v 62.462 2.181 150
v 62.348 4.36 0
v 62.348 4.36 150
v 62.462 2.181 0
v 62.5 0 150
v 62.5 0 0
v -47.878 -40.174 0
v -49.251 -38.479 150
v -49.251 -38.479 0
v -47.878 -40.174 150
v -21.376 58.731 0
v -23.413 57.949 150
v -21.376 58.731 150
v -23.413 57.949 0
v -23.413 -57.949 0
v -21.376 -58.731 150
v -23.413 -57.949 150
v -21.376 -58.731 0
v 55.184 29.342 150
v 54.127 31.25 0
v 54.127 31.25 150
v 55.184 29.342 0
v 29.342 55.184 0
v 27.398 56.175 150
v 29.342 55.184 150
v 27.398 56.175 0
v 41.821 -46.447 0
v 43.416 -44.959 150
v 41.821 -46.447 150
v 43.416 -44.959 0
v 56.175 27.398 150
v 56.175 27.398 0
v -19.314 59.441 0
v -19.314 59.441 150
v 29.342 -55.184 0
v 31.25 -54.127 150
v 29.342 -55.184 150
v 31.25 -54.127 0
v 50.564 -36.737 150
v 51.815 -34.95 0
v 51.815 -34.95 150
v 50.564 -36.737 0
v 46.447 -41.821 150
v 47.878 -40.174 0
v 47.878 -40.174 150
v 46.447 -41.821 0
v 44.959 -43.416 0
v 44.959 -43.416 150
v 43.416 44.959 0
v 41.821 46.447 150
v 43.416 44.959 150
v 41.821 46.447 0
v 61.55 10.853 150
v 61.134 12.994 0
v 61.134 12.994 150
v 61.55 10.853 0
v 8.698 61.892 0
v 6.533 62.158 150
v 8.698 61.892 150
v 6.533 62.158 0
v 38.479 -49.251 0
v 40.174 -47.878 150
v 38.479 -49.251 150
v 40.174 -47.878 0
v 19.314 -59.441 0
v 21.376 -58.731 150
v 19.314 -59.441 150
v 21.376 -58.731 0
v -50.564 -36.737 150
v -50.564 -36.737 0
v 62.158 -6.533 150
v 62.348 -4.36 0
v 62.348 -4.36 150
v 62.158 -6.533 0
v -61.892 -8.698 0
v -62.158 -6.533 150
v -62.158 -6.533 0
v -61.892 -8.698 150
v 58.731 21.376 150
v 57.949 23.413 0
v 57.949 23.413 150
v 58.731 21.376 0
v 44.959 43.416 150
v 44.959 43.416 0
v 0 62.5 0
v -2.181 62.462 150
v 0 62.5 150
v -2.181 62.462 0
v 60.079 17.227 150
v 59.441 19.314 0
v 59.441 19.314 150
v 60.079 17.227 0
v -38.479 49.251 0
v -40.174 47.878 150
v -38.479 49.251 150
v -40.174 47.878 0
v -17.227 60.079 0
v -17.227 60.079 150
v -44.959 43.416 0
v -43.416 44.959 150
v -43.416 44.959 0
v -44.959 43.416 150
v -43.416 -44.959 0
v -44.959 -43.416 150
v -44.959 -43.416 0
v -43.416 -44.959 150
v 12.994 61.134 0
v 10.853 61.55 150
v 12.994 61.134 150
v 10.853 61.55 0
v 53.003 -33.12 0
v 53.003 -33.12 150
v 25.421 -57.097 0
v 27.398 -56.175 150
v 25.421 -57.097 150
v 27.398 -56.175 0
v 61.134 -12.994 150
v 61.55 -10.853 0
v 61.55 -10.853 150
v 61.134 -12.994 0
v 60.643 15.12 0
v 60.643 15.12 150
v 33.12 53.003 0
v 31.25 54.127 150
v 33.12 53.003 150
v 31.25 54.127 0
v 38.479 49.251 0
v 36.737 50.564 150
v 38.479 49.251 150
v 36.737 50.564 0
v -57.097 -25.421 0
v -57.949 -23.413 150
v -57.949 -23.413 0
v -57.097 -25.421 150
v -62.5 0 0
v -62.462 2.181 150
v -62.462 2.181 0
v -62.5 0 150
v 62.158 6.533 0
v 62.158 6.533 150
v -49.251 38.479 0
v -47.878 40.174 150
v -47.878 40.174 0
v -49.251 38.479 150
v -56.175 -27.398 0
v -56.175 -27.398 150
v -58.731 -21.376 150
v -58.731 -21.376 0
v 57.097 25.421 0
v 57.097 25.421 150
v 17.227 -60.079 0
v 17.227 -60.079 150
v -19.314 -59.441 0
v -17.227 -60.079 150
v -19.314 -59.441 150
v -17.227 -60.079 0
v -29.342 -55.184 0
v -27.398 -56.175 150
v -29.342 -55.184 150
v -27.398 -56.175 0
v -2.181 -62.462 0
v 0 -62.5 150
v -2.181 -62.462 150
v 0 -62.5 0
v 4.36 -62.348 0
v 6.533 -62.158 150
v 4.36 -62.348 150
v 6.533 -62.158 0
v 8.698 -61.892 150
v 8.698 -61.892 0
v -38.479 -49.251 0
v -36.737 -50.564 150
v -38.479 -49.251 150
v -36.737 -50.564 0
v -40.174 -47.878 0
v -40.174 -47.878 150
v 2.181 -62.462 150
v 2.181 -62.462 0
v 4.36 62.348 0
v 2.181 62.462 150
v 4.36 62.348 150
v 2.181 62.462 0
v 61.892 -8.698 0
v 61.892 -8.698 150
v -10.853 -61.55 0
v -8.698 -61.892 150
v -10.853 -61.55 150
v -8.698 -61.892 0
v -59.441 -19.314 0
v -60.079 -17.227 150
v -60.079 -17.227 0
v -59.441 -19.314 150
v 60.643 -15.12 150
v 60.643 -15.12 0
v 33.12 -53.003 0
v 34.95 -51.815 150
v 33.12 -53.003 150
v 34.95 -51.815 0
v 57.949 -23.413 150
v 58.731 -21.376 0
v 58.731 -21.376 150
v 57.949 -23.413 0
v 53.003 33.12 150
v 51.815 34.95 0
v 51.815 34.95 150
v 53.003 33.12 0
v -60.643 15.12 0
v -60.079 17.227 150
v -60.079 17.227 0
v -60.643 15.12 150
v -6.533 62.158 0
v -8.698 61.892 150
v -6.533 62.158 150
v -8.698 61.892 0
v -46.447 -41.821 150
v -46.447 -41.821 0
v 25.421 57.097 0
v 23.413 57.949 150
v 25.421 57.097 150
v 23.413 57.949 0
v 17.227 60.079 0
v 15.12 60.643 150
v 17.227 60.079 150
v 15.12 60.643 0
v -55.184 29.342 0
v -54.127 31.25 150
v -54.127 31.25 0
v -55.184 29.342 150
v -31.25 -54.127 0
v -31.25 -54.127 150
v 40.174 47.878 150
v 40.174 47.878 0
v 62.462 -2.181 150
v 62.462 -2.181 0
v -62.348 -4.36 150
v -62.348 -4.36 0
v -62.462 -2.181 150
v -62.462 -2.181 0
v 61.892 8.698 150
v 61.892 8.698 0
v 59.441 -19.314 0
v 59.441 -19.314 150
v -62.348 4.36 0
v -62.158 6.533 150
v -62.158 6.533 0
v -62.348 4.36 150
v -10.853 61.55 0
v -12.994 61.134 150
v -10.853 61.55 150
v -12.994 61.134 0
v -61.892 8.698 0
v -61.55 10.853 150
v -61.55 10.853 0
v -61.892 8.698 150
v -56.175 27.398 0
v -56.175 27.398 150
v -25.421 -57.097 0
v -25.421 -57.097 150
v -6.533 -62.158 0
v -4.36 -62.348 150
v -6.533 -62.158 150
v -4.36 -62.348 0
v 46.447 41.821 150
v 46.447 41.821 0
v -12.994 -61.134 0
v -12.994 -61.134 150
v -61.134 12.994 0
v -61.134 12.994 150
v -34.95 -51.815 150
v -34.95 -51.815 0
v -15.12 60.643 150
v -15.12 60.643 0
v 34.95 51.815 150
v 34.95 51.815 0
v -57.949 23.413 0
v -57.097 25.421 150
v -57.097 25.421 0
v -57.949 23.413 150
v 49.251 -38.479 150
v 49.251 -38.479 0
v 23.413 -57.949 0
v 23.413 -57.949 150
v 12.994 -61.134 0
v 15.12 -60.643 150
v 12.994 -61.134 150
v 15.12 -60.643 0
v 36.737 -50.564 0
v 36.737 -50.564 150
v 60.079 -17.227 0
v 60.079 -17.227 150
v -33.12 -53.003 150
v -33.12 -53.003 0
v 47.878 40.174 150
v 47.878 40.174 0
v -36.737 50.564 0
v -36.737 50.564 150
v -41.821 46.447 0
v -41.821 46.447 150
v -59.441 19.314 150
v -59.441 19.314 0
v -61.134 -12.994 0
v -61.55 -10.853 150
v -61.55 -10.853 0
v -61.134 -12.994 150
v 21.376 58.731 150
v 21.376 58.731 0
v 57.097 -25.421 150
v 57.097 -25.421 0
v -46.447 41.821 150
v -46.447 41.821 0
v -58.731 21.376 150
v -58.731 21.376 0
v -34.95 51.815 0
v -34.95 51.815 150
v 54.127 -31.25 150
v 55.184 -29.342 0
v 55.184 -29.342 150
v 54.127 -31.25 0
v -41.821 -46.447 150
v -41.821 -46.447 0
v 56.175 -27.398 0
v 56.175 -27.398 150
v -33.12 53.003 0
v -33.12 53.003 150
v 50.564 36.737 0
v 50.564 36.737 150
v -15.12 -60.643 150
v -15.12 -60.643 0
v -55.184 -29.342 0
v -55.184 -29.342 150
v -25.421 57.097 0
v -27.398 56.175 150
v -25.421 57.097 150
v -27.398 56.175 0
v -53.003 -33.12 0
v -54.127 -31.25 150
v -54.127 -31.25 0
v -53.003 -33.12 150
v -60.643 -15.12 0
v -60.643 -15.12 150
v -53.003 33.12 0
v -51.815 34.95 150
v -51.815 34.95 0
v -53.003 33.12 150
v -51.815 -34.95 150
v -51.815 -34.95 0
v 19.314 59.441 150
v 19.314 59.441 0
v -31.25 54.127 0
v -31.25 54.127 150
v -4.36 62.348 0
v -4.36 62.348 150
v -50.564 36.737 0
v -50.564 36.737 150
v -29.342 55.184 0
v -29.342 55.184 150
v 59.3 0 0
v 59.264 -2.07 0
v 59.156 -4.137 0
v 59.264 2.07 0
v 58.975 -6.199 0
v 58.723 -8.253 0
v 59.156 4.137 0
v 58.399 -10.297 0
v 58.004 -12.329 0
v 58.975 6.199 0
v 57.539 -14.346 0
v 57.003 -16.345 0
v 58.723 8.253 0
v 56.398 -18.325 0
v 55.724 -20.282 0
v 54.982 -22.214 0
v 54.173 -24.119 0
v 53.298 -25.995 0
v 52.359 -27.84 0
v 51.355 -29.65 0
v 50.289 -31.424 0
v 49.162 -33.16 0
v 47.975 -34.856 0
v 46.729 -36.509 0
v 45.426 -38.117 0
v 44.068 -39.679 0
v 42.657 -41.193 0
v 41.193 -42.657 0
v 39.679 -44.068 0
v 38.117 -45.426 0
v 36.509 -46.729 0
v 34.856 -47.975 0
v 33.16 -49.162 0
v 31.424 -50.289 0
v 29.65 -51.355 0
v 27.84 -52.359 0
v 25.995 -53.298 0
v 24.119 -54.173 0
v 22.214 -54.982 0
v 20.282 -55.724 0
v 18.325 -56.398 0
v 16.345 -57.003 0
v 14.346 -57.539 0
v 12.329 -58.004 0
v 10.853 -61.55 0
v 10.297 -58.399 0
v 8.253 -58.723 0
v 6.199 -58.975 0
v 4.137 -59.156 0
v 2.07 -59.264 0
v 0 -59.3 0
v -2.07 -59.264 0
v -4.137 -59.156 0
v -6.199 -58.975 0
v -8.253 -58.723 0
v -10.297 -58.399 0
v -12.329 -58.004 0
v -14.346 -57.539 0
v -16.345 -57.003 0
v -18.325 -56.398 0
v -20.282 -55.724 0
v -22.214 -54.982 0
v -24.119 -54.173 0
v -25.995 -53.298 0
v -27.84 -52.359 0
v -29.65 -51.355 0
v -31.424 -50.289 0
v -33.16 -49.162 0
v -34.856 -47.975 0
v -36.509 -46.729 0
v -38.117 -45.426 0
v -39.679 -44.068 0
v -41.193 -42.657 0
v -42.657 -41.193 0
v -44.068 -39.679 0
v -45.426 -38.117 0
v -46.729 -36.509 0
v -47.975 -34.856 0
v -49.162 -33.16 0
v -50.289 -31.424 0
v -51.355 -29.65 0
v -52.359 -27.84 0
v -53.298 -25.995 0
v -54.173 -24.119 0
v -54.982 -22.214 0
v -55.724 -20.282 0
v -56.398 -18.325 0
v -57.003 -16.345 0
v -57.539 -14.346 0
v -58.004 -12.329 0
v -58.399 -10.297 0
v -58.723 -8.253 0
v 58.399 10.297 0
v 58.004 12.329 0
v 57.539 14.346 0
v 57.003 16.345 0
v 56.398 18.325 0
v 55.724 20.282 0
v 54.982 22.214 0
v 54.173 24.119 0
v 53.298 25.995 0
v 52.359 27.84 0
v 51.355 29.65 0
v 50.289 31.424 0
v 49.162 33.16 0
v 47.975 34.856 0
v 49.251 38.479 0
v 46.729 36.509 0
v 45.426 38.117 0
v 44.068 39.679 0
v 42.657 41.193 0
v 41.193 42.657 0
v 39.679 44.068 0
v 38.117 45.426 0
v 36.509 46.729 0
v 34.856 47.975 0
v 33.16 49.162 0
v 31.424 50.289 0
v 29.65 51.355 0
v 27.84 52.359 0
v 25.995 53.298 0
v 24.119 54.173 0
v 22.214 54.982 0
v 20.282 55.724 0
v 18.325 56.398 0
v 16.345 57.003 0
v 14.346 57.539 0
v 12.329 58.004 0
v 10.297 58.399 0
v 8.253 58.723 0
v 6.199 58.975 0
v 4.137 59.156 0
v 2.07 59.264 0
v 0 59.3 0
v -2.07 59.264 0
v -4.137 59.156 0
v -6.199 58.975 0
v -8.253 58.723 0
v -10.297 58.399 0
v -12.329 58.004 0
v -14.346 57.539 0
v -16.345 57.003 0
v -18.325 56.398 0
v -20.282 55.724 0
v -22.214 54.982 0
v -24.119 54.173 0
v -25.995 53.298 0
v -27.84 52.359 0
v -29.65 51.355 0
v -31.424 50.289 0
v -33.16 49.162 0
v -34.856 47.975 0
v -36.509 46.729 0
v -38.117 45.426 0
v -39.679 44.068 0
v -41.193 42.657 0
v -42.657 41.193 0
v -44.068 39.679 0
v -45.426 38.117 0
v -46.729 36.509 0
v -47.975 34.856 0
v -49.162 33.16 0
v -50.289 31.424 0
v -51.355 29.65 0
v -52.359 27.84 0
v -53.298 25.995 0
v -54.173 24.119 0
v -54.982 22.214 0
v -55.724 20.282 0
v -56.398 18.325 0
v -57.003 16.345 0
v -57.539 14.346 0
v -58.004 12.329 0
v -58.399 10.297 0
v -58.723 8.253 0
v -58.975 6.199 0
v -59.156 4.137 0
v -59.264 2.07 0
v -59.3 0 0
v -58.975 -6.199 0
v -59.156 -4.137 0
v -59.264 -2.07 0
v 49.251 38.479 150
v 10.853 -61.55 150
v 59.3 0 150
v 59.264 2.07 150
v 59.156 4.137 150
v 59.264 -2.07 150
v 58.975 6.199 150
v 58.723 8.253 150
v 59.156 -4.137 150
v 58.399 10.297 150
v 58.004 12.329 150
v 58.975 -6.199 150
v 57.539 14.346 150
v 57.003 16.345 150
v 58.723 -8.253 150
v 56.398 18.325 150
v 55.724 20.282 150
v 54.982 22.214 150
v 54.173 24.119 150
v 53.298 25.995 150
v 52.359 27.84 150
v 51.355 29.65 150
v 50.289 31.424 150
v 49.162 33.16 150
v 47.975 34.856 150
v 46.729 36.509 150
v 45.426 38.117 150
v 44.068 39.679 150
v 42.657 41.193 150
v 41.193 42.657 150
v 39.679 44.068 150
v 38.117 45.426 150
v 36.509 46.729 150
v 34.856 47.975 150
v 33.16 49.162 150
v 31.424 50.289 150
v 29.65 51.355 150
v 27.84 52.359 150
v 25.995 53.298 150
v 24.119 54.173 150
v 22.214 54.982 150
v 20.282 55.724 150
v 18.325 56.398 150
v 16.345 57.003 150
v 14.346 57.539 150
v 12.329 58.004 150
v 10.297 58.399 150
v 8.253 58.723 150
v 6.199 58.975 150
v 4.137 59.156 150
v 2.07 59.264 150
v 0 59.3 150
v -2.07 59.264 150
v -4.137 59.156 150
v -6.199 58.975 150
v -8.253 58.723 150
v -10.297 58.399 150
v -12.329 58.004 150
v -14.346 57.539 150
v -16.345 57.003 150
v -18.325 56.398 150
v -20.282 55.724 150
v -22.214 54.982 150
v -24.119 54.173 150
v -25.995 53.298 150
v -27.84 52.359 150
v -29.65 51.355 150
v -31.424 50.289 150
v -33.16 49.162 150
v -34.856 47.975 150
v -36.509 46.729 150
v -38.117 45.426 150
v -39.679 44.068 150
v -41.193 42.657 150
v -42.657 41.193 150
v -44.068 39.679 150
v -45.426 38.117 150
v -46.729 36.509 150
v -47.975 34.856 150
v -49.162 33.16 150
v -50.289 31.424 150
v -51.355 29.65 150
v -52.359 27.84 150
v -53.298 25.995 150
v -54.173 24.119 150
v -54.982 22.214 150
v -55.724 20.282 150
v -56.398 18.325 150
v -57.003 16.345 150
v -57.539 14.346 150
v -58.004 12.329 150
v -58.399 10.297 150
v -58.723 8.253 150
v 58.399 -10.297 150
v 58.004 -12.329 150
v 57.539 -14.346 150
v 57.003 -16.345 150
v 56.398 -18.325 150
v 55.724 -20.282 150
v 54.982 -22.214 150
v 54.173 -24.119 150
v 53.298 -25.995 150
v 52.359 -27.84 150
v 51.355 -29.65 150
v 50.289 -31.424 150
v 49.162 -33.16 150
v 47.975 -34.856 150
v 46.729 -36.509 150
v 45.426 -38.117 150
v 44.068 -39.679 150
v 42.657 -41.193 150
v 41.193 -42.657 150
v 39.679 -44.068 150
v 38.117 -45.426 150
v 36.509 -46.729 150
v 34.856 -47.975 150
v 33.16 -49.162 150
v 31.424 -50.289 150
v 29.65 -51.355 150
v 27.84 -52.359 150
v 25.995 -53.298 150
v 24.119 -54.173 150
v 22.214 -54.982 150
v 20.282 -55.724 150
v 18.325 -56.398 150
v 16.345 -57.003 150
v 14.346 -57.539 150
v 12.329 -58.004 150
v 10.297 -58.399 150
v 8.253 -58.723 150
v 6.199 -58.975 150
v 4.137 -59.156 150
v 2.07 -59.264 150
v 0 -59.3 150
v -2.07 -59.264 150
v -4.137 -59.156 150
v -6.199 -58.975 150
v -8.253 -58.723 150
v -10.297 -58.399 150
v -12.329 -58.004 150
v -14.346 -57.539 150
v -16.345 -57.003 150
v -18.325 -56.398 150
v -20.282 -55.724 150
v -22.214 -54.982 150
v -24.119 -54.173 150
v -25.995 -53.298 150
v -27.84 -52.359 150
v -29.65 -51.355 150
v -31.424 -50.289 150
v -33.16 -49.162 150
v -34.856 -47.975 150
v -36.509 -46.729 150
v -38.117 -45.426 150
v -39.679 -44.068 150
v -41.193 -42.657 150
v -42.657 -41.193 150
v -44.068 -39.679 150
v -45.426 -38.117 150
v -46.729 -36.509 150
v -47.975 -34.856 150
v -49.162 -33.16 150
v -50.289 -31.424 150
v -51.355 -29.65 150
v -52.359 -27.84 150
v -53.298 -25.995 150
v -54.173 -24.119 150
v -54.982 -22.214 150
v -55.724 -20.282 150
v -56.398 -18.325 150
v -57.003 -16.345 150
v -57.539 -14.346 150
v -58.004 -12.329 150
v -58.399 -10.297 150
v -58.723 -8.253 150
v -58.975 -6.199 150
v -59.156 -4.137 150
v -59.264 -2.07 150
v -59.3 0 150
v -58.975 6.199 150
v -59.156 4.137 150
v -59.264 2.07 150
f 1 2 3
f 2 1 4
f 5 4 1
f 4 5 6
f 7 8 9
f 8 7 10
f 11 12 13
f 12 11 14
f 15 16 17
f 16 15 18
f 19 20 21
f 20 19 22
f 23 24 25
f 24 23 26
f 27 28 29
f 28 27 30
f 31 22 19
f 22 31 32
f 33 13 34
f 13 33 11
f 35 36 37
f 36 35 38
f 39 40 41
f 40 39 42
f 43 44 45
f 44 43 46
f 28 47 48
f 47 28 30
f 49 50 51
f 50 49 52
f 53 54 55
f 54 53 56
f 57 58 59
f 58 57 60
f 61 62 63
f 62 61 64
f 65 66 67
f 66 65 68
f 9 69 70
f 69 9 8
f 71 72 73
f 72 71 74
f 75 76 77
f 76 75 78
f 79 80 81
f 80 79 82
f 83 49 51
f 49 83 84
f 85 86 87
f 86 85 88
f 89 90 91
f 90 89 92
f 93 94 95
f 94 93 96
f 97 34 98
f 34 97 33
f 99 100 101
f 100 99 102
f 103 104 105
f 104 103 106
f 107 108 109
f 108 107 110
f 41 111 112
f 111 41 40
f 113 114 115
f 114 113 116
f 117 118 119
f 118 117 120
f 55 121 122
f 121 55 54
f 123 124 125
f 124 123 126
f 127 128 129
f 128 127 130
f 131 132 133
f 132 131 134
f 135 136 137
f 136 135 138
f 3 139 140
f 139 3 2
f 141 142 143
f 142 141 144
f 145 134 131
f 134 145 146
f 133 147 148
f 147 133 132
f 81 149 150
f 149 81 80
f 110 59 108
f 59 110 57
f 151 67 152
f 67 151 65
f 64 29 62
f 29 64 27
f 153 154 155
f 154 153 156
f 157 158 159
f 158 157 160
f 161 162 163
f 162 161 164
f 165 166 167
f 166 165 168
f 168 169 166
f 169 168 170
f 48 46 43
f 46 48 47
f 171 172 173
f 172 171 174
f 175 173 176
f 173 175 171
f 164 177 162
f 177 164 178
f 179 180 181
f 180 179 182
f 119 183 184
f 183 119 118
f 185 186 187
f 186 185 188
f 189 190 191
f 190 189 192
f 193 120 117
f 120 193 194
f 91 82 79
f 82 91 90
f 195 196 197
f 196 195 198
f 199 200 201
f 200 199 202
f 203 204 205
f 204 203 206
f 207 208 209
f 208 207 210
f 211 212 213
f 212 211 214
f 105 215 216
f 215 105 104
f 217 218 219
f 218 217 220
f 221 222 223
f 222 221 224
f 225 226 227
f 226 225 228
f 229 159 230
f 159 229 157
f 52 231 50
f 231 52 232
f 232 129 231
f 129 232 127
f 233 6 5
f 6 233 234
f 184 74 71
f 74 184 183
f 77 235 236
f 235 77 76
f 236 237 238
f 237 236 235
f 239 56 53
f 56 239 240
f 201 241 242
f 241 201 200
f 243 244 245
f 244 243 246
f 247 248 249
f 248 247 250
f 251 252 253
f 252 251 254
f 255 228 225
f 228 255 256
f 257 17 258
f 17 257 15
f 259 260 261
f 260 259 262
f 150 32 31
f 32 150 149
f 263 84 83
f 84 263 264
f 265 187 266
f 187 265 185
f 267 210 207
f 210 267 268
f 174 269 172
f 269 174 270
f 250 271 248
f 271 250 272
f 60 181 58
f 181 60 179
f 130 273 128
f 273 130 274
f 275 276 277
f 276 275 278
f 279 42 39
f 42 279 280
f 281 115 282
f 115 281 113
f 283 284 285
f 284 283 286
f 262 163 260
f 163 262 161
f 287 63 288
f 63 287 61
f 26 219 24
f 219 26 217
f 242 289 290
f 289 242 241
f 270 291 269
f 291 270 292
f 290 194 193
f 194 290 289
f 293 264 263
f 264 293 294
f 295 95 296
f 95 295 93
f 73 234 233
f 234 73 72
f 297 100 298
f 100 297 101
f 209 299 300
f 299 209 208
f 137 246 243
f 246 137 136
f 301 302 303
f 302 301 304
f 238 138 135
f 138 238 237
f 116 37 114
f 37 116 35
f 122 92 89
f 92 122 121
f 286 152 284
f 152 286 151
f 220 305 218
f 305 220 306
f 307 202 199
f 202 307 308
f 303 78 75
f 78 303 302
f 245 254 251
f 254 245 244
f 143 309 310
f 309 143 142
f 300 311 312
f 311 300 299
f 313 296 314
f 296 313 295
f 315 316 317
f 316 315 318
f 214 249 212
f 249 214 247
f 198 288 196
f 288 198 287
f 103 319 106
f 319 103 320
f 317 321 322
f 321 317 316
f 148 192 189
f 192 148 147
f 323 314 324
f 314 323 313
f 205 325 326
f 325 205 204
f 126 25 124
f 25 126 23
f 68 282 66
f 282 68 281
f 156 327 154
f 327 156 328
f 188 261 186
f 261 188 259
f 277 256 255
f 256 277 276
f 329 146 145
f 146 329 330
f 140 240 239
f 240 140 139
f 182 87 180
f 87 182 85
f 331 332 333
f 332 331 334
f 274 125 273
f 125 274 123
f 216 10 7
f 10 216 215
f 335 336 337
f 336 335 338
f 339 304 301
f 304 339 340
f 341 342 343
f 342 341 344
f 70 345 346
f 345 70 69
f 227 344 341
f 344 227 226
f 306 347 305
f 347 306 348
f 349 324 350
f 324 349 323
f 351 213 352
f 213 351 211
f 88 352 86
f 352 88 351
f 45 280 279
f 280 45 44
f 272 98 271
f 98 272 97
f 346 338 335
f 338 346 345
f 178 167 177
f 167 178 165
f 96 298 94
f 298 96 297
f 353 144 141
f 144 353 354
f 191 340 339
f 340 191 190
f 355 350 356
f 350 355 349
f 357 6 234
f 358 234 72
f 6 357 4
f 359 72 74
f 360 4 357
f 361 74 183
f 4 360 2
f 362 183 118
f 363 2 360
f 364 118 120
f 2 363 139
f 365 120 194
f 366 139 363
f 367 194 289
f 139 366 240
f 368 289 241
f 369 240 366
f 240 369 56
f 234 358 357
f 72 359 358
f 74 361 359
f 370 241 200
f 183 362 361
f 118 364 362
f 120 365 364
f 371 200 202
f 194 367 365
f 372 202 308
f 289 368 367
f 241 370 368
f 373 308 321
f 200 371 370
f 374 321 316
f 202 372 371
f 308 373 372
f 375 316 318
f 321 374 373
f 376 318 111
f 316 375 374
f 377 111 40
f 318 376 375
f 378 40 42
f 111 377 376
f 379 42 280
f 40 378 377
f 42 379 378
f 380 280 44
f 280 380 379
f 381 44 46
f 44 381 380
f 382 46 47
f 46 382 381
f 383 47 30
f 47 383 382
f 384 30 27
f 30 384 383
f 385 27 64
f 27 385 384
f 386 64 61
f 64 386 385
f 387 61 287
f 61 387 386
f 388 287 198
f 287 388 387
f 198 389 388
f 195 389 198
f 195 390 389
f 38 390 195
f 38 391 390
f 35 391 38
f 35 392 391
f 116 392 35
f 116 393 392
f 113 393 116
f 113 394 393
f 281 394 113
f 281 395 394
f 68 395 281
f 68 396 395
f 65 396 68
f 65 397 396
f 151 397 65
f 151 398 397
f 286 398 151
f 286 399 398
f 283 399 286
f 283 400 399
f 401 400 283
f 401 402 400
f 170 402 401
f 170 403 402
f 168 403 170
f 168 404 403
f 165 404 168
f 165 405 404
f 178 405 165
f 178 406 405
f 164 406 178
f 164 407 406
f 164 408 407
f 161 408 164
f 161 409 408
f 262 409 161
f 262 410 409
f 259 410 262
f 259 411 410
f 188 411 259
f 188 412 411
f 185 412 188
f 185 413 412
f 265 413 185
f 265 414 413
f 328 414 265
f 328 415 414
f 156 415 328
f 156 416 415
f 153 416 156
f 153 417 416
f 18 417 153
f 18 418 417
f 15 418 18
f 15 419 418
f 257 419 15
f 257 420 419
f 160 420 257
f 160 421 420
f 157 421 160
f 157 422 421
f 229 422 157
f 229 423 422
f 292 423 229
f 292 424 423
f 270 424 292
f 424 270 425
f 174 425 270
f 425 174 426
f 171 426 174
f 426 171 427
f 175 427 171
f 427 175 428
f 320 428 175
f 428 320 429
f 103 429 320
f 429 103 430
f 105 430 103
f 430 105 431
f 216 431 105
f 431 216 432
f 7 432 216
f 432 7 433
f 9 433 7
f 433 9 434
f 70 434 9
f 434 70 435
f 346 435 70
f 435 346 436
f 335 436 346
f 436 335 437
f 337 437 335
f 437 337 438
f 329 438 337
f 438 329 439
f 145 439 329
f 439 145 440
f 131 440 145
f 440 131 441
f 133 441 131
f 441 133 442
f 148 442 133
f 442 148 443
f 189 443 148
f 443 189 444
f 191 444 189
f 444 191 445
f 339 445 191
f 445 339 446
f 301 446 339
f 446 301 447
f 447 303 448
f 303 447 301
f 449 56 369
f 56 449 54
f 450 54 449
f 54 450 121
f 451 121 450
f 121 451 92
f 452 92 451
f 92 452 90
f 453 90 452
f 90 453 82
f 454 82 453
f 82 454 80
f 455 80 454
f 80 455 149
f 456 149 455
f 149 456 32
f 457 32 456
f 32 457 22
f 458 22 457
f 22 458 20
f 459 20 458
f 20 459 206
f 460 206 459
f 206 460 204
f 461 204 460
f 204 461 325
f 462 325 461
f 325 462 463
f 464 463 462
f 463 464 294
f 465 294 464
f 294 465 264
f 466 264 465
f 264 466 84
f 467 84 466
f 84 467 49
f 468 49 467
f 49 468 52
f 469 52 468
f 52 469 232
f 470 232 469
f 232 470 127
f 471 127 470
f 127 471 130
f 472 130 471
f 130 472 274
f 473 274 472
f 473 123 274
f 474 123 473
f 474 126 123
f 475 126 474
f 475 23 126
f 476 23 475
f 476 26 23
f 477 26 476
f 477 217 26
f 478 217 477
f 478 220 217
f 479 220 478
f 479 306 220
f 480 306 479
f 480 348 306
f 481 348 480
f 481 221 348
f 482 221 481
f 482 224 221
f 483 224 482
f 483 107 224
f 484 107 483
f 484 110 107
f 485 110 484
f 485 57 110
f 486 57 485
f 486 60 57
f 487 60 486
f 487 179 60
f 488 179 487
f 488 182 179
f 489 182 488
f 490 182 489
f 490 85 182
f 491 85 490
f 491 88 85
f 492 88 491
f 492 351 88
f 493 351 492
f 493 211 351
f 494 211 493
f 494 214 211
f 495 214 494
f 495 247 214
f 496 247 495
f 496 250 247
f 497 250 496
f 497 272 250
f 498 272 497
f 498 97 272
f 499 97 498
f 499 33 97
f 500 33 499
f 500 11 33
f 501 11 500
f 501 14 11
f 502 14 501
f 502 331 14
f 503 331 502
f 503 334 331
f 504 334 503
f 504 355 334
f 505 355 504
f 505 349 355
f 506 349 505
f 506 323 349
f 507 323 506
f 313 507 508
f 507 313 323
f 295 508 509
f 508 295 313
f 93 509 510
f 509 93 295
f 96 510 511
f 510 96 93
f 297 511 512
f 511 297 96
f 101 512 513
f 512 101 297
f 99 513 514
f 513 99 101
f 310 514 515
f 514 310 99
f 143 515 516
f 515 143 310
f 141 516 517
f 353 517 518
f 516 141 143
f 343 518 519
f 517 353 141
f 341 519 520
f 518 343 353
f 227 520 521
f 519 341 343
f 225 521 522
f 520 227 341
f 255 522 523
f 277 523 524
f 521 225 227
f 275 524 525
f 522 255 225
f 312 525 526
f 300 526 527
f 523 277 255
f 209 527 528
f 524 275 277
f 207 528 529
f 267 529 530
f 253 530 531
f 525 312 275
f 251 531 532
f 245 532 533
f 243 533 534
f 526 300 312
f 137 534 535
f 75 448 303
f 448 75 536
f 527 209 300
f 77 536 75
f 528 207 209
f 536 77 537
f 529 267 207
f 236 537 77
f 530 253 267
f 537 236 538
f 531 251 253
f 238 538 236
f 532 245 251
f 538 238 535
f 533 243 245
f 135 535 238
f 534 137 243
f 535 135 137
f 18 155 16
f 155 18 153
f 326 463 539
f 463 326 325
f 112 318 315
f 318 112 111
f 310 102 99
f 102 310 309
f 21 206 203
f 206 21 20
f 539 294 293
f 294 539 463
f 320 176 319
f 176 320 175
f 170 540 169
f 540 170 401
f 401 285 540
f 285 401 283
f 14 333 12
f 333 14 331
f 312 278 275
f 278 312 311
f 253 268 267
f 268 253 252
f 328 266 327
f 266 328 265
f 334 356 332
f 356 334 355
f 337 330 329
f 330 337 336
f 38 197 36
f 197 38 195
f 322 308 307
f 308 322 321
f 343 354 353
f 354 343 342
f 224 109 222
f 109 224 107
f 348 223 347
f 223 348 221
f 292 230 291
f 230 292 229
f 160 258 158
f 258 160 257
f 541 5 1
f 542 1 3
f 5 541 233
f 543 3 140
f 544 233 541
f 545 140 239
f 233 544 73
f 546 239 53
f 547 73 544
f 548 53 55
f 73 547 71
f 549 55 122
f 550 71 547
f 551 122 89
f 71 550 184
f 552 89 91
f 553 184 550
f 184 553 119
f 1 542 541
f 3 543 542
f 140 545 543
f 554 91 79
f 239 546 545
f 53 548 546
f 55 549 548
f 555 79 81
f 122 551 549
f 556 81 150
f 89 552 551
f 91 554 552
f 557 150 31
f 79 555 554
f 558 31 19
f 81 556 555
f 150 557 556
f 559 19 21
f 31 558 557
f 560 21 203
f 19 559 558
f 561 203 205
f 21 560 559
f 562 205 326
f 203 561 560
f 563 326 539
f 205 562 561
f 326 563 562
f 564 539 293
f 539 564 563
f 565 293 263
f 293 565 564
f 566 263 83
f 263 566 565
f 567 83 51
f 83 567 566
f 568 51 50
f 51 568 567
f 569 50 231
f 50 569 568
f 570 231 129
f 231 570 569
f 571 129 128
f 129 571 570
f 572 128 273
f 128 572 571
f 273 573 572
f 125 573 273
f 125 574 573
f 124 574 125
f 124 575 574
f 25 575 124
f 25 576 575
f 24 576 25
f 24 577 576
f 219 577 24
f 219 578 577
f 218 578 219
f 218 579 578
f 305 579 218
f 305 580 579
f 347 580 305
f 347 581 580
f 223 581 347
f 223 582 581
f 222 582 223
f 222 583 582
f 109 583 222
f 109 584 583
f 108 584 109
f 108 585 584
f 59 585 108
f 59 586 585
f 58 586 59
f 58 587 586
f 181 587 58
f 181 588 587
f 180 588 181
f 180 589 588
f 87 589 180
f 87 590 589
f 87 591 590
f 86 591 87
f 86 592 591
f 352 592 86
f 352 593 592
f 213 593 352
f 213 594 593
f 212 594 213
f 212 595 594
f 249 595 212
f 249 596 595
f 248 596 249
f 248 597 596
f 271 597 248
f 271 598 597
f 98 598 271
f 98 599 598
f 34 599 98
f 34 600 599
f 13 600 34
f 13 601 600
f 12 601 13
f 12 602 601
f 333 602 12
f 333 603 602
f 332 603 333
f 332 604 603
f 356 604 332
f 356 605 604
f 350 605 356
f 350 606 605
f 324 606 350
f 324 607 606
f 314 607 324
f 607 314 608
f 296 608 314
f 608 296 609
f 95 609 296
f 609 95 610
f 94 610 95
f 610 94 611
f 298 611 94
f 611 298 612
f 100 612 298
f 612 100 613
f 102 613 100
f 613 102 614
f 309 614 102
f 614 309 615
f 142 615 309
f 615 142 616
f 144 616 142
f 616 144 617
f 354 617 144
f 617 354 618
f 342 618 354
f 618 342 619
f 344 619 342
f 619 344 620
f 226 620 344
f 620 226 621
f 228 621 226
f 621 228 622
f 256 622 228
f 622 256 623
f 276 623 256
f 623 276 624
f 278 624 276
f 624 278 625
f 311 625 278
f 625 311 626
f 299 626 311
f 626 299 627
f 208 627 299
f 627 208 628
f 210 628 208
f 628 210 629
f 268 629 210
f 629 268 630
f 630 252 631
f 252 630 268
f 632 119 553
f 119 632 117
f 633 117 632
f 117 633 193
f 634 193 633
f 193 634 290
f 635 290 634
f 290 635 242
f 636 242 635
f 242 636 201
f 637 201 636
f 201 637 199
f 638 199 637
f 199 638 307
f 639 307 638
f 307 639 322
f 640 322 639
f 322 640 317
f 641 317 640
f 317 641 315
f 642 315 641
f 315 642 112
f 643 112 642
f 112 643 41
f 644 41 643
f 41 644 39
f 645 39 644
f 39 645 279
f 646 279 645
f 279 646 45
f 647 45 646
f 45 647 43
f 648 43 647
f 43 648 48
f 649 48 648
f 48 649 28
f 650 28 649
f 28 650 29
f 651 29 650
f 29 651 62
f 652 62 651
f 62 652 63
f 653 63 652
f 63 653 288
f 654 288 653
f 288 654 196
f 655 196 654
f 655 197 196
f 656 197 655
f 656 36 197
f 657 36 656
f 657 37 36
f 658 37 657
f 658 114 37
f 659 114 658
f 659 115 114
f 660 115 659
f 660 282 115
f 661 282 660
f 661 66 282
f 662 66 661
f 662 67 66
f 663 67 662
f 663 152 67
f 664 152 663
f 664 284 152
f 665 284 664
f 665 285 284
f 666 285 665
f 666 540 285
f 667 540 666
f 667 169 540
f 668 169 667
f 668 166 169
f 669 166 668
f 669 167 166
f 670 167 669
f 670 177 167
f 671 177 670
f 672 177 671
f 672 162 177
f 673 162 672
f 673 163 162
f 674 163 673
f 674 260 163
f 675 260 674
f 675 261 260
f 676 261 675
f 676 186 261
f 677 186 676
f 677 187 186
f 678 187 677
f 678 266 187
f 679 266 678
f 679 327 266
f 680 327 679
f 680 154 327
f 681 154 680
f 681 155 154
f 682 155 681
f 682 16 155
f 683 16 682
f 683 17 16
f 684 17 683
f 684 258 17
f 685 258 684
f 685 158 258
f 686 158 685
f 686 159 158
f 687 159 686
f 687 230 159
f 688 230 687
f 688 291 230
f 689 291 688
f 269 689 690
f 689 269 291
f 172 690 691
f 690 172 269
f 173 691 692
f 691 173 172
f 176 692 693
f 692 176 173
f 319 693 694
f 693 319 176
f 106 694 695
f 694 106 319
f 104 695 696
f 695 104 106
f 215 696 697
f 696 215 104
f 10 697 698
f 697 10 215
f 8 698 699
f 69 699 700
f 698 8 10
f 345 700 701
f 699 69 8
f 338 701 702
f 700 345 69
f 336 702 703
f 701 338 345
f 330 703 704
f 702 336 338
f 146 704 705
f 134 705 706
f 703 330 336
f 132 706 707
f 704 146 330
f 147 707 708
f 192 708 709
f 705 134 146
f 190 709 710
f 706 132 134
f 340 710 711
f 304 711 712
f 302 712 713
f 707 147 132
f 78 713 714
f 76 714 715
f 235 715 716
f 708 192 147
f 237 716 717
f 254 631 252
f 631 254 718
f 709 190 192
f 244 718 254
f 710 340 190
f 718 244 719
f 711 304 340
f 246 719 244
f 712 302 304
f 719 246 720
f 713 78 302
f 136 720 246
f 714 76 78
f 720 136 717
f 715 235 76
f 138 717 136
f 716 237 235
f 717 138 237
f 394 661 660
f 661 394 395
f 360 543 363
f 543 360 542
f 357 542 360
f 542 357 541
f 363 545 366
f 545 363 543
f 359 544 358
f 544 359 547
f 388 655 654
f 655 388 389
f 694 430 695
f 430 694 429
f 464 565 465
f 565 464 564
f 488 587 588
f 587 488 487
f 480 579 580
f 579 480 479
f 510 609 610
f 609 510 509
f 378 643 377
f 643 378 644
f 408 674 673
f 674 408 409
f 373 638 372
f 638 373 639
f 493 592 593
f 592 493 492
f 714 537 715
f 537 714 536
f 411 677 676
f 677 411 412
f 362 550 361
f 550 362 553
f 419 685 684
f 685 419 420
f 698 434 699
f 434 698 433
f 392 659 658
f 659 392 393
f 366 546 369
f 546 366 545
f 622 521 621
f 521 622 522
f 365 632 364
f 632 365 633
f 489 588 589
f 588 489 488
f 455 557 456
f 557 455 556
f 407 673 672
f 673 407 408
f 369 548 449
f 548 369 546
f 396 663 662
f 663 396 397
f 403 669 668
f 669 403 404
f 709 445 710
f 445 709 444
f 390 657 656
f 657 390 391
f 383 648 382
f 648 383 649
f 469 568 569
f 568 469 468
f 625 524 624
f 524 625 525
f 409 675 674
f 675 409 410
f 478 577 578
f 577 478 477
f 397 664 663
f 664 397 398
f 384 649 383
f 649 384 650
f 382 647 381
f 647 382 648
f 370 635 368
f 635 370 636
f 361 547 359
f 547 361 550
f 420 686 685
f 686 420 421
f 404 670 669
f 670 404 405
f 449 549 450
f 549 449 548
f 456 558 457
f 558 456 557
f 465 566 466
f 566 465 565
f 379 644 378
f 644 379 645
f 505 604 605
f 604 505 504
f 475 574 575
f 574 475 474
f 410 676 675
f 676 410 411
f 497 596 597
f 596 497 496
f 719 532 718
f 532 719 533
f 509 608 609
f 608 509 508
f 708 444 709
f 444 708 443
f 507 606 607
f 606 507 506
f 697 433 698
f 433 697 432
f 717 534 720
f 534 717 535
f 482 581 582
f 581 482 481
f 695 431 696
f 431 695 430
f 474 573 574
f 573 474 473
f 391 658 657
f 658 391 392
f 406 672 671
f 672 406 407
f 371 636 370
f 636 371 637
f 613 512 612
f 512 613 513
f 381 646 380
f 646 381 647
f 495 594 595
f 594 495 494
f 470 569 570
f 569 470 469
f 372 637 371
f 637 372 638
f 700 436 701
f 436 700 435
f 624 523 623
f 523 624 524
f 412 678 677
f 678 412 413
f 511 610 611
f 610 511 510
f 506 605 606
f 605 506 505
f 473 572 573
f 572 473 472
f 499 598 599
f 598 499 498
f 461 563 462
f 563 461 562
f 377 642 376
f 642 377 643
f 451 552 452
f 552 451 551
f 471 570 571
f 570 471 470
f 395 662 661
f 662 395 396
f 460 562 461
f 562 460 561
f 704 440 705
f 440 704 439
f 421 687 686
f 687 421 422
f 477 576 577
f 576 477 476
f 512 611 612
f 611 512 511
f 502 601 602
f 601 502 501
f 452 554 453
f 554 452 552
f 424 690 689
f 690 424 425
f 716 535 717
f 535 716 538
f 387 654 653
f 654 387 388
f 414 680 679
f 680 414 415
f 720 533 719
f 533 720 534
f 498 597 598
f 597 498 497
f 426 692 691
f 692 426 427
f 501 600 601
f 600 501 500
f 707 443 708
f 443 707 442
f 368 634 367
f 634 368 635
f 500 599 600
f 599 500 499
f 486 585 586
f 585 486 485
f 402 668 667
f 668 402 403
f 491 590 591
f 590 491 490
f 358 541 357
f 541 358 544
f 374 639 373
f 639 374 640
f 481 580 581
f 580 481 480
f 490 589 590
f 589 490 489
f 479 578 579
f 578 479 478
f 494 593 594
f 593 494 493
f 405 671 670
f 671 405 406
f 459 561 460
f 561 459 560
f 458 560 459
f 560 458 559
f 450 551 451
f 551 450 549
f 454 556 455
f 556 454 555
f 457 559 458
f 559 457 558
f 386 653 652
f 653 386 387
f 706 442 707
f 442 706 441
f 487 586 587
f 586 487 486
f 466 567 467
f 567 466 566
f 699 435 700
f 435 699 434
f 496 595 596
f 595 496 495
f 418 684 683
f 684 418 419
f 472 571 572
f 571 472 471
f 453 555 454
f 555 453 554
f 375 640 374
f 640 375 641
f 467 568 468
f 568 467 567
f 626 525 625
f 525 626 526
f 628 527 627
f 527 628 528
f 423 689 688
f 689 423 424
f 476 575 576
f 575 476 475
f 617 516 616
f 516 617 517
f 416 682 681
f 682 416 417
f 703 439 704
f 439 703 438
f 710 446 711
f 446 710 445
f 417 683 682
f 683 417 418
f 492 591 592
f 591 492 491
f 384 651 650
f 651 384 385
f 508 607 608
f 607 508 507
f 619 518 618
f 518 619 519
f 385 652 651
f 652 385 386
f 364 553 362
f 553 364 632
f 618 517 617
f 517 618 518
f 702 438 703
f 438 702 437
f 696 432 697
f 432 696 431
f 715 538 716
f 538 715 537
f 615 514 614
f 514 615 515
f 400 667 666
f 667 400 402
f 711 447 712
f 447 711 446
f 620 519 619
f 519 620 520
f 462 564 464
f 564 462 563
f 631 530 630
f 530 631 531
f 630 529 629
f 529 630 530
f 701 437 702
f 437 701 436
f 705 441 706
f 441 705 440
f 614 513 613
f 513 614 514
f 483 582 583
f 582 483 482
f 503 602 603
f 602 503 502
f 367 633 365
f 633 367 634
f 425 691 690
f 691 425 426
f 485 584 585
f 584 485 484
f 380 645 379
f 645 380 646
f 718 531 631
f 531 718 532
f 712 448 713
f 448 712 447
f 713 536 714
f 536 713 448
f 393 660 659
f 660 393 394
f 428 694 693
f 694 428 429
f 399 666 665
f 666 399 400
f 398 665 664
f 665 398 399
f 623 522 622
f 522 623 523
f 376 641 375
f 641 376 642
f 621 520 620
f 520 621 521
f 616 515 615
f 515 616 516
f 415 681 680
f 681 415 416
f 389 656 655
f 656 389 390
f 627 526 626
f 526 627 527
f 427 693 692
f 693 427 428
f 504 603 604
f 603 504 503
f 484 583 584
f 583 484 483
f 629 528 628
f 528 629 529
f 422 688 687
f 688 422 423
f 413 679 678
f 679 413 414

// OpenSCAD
$fn = 180;

// HT pipe: nominal DN125, length 150 mm
// Assumptions (typical HT dimensions):
// - Outer diameter: 125 mm
// - Wall thickness: 3.2 mm (approx.)
// Adjust parameters if you need exact manufacturer dimensions.

od = 125;
wall = 3.2;
id = od - 2*wall;
len = 150;

difference() {
  cylinder(h = len, d = od);
  translate([0,0,-0.1]) cylinder(h = len + 0.2, d = id);
}
